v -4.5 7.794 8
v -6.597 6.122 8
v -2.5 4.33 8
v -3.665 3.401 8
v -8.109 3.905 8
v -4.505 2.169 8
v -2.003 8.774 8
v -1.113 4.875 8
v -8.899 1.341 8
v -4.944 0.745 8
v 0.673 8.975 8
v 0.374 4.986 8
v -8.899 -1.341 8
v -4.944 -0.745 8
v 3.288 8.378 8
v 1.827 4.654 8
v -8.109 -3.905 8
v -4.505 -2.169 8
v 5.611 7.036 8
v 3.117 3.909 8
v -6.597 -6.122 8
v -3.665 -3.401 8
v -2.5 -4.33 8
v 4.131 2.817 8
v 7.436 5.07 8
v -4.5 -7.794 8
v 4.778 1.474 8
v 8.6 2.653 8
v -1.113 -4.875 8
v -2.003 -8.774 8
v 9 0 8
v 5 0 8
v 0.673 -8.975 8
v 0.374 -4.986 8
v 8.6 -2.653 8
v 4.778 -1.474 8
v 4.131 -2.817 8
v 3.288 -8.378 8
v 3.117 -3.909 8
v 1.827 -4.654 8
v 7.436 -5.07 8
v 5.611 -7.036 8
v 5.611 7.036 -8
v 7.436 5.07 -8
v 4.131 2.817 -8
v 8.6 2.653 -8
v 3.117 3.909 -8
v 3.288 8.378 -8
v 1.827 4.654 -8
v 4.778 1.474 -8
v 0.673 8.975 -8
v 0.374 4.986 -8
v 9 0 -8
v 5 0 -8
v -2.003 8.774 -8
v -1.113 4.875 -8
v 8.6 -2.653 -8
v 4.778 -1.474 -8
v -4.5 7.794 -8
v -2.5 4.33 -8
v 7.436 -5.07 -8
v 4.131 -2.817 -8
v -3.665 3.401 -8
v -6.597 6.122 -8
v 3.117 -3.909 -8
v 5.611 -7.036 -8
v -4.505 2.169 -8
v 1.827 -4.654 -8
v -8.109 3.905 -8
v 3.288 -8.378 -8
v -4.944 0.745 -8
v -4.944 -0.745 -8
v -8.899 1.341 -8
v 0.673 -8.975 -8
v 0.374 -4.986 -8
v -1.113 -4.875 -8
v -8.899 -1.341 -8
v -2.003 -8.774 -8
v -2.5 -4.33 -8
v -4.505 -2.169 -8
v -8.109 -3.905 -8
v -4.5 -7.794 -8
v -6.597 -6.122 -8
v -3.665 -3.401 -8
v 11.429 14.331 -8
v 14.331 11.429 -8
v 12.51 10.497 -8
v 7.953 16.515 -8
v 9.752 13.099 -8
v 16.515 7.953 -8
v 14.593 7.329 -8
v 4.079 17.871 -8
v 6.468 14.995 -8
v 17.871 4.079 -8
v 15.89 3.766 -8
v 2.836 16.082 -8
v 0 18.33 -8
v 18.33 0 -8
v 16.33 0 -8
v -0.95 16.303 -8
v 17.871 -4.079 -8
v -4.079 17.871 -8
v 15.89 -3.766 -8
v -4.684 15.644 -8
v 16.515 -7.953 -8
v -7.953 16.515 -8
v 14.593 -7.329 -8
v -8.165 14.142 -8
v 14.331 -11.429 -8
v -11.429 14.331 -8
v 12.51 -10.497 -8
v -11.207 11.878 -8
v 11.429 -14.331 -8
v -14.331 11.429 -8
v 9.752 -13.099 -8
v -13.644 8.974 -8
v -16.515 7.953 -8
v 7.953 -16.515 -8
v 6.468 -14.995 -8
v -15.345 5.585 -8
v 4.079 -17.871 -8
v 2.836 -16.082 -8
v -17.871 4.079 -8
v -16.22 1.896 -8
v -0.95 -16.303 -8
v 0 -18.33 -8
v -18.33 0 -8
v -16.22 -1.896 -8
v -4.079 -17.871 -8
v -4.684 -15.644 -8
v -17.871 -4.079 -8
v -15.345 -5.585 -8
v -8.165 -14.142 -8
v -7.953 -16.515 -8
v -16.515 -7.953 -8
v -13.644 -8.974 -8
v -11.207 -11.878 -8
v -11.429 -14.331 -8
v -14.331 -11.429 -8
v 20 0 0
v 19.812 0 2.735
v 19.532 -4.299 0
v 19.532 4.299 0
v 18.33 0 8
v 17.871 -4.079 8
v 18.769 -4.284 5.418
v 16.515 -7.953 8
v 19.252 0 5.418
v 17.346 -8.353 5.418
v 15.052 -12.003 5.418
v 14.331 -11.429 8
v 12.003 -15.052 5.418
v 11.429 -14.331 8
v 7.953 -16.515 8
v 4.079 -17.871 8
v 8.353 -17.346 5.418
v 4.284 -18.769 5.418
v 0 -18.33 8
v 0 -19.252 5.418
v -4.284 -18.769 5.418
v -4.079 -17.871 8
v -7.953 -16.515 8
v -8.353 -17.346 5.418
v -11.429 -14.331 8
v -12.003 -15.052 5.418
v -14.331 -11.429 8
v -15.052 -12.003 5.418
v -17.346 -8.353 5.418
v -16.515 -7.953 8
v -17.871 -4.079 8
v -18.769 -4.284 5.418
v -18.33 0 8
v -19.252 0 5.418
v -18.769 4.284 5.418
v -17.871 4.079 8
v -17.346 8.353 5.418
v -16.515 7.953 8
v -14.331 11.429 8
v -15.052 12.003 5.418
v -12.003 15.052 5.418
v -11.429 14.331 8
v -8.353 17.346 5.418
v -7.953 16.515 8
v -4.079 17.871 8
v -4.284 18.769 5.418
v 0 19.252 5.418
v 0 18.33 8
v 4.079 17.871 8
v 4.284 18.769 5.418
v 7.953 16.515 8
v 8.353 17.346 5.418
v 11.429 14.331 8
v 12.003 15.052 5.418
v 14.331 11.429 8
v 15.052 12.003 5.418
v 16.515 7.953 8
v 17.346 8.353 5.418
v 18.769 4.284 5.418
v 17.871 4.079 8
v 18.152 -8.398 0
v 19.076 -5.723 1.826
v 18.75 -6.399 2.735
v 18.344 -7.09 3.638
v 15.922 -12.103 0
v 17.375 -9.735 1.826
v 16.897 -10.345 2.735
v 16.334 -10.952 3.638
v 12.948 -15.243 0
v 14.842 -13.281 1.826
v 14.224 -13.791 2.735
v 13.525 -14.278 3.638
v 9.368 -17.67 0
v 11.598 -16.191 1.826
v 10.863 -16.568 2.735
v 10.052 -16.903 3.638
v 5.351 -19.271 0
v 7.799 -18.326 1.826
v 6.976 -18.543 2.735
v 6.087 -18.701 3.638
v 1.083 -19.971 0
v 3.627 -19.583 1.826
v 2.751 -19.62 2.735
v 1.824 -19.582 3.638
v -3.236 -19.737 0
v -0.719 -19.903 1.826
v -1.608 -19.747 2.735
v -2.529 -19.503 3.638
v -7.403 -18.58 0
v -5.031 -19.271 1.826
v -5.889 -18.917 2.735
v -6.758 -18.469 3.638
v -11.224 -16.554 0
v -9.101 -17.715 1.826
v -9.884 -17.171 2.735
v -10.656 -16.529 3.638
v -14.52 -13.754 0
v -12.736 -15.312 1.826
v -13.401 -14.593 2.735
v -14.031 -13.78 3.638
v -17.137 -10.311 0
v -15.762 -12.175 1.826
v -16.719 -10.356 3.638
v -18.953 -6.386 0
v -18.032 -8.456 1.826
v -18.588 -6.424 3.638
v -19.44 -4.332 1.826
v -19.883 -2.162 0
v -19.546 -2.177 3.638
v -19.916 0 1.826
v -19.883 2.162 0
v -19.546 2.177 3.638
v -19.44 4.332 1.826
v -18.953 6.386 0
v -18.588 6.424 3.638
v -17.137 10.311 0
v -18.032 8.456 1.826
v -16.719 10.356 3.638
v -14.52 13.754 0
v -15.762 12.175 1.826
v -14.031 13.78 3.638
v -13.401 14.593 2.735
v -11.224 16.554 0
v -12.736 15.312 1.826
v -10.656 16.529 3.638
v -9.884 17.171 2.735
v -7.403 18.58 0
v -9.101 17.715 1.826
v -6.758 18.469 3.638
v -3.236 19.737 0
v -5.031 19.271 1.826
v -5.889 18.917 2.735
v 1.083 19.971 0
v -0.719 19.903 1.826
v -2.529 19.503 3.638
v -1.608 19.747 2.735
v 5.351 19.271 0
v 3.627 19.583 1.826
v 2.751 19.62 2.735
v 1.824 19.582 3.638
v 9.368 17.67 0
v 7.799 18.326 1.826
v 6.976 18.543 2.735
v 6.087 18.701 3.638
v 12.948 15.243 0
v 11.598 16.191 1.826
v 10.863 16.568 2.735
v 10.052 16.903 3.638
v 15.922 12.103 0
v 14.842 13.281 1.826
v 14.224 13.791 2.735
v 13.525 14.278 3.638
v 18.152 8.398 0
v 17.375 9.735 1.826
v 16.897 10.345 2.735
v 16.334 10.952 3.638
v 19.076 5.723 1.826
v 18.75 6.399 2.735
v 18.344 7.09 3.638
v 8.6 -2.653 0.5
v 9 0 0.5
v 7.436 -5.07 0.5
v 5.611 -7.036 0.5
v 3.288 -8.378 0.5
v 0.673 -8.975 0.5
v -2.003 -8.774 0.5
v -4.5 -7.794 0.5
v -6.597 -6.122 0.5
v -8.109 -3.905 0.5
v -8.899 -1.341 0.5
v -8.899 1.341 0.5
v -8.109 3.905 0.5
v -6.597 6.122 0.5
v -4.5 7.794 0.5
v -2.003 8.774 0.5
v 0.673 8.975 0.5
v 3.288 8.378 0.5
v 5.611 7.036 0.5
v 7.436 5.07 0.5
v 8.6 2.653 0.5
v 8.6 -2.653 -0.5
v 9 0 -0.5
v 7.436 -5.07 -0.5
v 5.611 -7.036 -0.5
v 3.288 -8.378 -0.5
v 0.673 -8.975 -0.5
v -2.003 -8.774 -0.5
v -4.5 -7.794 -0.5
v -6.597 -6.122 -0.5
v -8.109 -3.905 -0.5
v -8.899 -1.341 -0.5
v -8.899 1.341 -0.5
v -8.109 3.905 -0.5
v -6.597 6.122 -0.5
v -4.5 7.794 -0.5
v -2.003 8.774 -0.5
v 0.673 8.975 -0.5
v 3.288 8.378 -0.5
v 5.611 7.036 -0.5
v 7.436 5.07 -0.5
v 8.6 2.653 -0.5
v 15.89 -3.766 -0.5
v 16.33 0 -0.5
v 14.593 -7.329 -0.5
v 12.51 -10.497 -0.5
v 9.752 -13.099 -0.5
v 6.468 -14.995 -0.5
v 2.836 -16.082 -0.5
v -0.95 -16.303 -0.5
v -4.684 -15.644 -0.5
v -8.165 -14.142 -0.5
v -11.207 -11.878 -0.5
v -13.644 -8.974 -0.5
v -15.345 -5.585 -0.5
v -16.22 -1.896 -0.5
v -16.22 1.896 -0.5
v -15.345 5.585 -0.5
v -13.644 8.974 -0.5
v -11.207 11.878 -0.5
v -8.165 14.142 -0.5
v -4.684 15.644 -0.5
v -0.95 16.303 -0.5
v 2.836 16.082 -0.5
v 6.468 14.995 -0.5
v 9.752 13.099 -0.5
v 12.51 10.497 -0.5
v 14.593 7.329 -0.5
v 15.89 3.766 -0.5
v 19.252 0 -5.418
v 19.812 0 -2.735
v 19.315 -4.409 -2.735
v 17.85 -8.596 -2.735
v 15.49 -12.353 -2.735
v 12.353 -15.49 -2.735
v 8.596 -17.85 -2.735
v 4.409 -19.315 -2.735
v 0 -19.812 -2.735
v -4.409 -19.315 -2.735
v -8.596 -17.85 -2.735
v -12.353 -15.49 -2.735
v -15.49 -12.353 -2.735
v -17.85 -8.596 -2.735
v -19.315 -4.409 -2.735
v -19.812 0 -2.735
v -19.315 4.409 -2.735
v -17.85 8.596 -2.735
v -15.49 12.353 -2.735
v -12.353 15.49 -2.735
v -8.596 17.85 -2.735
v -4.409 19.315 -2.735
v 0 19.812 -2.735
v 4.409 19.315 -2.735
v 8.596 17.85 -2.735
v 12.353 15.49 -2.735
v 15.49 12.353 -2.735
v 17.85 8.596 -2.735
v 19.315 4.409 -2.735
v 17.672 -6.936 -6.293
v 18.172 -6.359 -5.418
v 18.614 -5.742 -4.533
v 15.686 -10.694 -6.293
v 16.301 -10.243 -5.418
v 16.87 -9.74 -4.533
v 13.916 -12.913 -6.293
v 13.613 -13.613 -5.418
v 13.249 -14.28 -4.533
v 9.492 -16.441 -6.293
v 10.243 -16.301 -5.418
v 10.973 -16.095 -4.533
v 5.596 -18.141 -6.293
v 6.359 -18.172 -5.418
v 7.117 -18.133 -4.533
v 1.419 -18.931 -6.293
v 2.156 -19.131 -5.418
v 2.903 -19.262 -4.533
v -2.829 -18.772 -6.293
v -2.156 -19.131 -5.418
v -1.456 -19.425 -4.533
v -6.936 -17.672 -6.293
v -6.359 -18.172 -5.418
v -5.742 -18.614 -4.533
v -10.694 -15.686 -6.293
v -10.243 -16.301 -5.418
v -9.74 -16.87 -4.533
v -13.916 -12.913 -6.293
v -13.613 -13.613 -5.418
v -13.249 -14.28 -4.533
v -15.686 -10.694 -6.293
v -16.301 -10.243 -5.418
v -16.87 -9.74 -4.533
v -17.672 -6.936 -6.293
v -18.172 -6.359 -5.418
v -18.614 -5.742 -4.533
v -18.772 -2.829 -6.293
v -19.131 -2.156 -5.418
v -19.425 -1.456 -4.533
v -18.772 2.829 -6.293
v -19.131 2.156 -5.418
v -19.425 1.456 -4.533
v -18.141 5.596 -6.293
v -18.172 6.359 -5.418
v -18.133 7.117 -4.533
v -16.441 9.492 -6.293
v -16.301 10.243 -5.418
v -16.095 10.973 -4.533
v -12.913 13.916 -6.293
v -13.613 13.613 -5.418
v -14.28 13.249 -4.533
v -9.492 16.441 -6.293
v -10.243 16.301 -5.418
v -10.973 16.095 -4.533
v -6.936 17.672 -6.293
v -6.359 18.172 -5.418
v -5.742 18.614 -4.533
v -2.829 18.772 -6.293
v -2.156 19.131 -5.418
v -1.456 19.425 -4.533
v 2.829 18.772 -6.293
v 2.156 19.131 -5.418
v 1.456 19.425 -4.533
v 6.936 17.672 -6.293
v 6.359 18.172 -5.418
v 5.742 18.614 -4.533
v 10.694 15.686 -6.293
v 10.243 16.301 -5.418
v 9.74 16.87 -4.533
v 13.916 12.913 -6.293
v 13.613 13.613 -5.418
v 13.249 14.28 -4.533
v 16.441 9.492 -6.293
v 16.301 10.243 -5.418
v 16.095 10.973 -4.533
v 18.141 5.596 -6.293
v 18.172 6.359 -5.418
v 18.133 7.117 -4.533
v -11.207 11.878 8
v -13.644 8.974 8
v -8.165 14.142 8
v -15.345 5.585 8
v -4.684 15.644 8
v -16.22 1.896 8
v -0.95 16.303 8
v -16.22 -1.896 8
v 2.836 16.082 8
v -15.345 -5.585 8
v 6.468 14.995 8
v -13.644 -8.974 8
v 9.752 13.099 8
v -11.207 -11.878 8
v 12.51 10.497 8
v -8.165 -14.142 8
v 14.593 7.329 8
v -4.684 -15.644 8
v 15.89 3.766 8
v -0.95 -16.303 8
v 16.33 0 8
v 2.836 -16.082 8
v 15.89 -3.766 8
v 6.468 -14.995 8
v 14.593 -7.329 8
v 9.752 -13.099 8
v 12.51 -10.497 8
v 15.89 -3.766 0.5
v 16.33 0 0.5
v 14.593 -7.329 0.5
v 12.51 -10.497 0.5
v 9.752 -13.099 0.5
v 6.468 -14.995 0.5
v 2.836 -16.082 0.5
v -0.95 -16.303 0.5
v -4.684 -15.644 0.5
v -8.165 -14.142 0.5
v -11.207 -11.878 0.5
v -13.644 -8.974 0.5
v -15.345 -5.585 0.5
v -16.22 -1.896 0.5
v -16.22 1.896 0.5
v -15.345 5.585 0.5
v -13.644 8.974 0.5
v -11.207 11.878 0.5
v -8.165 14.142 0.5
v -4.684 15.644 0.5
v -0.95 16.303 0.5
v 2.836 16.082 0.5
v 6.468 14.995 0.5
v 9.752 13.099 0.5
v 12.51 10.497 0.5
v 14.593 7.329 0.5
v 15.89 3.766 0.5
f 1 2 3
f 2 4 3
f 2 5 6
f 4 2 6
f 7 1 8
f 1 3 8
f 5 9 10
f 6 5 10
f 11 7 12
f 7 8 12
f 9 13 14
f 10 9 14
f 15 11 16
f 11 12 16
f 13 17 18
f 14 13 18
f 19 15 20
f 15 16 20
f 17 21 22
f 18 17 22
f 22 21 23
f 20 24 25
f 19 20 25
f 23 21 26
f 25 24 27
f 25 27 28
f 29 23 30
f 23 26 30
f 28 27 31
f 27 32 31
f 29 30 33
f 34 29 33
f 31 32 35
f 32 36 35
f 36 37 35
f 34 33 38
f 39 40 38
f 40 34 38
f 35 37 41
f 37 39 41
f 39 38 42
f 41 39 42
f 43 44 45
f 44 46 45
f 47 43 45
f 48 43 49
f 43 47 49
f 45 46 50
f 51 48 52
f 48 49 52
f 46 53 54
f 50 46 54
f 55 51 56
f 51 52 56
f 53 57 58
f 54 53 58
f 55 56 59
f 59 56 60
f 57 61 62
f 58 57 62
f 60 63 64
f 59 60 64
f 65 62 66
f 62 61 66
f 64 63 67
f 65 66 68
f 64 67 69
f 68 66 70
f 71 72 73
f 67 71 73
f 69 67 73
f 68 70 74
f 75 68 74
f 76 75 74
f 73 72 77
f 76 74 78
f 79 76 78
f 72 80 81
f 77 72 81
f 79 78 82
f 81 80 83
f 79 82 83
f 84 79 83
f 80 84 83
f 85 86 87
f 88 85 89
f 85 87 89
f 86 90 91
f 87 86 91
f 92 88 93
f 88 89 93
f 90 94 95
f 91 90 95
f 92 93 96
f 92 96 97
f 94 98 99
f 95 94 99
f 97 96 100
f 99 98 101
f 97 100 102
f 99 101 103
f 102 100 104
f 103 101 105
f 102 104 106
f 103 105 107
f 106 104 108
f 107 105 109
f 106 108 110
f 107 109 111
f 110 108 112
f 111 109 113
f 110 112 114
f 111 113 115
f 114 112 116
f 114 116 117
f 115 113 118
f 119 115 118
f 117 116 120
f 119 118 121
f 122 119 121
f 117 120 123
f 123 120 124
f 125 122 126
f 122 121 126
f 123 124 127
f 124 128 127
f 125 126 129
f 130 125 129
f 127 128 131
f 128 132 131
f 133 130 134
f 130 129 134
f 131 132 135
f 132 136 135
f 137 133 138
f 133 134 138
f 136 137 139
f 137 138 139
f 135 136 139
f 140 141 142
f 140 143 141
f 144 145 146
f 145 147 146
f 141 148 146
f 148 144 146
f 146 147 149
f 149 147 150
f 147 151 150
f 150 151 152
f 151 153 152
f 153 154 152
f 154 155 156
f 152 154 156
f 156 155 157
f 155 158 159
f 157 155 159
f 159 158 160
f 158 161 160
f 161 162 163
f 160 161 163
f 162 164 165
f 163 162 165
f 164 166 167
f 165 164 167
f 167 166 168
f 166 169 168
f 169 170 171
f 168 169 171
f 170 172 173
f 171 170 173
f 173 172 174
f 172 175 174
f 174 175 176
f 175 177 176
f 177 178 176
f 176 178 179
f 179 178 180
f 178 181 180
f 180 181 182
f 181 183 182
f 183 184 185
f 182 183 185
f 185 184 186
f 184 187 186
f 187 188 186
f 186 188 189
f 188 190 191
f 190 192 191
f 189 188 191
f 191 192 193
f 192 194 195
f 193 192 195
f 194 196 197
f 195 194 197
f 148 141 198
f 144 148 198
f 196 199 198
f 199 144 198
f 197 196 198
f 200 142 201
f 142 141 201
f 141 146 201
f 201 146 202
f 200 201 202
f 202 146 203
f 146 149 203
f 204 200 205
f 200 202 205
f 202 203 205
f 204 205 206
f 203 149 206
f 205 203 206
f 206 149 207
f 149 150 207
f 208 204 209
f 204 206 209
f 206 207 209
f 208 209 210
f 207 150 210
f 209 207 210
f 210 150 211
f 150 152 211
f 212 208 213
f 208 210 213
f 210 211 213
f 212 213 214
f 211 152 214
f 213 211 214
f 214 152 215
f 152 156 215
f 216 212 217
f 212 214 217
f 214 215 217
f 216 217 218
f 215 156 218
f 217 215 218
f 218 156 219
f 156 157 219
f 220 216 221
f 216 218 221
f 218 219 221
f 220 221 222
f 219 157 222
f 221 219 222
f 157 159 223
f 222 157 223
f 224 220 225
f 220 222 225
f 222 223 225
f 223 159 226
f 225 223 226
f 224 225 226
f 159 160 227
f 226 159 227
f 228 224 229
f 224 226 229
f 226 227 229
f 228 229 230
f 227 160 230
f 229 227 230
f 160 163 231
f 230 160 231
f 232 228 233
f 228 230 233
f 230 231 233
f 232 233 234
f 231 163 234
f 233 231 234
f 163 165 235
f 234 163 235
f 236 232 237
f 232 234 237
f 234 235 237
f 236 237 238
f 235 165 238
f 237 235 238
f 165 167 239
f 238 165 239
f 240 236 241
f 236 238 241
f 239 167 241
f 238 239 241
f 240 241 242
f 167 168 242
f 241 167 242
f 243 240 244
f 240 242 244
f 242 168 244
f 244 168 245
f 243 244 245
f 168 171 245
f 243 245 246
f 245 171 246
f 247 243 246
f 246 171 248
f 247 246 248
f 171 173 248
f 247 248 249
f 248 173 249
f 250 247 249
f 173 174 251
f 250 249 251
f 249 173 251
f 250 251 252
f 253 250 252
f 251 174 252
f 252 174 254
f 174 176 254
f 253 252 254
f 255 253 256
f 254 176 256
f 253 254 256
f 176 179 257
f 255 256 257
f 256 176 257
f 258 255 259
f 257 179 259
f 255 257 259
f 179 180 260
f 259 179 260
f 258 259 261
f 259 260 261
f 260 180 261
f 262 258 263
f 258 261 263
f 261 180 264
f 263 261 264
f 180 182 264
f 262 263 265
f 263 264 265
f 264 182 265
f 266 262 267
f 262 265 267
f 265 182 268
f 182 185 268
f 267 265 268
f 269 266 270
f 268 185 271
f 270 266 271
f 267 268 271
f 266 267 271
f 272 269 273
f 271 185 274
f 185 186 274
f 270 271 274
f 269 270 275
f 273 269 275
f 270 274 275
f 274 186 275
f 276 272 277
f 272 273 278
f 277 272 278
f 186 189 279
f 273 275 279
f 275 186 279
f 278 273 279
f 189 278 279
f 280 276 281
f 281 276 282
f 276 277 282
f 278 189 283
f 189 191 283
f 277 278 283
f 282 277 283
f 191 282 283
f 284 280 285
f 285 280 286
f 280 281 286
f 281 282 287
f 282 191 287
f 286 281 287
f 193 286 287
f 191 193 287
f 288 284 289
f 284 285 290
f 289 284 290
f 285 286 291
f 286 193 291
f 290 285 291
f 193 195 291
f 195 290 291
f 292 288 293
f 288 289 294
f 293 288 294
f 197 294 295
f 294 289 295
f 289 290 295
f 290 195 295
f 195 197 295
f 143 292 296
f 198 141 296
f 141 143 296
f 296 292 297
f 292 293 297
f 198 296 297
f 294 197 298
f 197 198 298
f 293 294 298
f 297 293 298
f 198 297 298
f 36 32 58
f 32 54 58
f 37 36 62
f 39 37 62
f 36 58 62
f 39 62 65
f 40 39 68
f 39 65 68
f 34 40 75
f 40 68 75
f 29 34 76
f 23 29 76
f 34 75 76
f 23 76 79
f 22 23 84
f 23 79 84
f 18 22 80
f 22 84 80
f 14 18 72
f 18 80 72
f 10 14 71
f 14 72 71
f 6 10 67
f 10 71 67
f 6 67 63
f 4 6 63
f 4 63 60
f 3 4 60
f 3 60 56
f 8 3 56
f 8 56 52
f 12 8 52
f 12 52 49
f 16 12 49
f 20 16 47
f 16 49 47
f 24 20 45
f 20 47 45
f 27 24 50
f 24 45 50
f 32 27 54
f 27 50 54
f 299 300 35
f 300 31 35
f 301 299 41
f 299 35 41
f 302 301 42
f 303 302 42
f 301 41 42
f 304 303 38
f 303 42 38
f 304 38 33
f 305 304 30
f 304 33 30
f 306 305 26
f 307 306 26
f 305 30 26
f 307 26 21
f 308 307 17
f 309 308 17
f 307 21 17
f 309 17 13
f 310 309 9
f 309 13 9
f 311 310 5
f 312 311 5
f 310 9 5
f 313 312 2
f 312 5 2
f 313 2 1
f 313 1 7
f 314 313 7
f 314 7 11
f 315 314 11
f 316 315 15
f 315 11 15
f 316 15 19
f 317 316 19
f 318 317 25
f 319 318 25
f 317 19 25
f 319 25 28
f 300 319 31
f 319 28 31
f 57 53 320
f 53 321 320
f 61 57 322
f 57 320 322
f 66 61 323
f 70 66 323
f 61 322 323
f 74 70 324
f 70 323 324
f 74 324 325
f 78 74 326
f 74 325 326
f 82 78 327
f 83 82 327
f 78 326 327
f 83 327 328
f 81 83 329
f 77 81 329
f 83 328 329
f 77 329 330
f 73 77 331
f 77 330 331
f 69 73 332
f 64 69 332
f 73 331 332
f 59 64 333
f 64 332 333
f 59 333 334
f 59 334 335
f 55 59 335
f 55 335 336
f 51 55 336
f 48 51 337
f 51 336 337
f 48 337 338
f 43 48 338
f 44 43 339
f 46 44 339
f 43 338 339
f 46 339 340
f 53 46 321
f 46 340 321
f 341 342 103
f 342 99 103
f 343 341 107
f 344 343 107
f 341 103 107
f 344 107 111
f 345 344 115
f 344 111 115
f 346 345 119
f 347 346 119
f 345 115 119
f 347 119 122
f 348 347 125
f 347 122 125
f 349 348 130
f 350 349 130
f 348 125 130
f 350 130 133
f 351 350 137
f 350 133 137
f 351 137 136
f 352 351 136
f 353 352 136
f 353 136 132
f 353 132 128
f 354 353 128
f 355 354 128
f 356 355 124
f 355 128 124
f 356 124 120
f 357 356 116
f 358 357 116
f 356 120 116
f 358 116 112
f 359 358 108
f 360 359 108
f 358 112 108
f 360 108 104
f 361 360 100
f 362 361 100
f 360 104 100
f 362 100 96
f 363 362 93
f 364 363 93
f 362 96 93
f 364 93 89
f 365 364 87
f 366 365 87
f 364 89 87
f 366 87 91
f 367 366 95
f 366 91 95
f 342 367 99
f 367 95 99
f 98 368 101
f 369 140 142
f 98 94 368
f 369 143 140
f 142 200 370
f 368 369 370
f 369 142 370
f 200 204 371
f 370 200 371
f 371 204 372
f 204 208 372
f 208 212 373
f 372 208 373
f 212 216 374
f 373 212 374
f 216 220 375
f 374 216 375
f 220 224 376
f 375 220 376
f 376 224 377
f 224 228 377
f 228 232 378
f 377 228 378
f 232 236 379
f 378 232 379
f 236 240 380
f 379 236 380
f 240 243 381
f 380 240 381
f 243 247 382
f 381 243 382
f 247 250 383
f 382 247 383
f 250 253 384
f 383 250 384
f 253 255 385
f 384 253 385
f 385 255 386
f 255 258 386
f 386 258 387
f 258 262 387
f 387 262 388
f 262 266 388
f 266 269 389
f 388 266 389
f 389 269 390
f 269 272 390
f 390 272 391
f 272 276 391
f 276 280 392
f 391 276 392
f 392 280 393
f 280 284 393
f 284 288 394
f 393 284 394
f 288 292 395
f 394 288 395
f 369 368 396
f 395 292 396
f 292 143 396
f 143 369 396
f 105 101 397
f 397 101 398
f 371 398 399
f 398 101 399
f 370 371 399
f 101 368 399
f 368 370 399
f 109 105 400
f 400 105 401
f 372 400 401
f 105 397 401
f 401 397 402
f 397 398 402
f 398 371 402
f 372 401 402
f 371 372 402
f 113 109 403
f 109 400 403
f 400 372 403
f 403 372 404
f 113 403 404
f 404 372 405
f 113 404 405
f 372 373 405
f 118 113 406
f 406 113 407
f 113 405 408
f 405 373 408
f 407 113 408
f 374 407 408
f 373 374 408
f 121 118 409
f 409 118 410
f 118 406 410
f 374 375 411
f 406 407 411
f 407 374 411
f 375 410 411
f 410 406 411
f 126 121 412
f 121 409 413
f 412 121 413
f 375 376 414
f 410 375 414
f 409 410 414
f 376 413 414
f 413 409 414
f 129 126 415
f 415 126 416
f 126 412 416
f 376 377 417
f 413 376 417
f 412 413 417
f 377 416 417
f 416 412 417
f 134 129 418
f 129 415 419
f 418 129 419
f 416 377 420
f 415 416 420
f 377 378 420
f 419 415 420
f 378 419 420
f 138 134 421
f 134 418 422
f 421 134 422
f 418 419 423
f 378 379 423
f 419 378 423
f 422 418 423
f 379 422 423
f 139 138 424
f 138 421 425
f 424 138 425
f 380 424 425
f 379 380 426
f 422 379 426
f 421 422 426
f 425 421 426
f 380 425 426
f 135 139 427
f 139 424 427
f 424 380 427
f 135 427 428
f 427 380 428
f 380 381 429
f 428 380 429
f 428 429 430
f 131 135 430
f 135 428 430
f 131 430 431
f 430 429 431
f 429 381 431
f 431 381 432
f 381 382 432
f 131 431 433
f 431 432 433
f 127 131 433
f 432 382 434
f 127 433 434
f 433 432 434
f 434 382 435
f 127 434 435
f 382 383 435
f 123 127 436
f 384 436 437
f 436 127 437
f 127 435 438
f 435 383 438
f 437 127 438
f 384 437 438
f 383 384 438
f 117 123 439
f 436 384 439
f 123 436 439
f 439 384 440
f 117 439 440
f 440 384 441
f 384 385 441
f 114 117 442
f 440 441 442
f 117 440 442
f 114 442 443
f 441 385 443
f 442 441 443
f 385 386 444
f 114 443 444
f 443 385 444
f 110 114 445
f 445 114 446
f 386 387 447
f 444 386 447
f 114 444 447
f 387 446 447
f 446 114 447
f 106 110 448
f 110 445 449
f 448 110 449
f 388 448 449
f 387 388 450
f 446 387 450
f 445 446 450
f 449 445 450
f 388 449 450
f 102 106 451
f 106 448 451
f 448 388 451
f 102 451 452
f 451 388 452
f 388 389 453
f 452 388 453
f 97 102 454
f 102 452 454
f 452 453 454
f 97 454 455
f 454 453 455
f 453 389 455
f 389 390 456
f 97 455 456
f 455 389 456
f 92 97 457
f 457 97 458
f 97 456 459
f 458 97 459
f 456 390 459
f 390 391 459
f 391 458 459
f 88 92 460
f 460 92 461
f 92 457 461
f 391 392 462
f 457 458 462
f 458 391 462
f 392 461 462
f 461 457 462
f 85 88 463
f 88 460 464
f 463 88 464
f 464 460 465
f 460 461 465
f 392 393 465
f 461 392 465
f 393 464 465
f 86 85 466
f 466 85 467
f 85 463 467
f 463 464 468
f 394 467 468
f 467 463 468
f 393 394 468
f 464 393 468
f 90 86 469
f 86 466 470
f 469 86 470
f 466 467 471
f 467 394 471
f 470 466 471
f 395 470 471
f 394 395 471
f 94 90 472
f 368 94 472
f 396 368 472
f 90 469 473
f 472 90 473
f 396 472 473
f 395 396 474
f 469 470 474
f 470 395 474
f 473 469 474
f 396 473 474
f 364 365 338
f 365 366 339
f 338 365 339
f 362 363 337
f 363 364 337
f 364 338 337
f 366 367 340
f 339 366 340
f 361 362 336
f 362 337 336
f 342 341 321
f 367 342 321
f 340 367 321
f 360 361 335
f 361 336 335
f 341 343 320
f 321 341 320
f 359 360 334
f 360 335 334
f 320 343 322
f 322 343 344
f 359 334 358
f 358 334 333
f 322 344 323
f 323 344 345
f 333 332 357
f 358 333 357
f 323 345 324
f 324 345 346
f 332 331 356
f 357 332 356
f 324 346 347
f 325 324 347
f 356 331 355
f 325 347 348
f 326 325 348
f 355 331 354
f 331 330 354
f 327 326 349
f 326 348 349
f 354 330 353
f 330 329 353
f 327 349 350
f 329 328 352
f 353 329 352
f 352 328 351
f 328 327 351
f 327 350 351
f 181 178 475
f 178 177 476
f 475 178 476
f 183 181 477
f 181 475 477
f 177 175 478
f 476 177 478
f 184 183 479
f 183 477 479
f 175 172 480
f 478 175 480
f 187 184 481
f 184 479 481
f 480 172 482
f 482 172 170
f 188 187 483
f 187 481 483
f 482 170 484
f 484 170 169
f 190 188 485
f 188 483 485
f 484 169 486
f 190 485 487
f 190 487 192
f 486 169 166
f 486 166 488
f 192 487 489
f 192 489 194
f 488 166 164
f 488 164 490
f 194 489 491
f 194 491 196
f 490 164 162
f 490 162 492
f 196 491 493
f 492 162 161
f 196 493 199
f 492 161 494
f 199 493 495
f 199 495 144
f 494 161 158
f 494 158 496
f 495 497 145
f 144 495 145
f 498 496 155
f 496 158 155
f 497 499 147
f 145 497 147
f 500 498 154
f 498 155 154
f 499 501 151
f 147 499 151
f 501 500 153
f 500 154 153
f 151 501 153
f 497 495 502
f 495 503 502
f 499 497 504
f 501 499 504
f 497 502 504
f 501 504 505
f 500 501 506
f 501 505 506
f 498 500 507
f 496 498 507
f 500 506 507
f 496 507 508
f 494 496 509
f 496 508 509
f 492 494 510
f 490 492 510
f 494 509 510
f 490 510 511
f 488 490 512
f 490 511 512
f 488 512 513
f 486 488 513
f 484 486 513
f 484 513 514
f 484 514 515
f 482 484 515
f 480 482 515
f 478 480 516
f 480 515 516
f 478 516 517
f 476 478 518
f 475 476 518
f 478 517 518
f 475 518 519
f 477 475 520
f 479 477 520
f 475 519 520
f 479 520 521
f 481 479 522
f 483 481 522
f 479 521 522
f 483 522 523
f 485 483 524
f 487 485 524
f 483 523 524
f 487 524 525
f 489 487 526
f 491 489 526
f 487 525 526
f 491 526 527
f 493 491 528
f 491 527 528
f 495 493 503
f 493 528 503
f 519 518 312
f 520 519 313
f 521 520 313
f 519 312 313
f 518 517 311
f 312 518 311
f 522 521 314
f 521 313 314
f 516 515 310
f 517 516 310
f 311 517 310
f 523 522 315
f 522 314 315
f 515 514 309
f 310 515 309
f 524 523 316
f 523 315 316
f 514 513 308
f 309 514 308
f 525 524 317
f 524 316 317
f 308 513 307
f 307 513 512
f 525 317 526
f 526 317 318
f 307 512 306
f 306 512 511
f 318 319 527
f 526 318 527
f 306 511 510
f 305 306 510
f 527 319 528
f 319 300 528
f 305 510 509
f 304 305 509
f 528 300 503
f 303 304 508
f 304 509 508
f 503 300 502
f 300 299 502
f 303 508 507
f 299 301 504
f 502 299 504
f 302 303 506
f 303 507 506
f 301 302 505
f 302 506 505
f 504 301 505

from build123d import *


with BuildPart() as f1:
    # F0 (on Front) → F1 (revolve)
    with BuildSketch(Plane.XZ):
        with BuildLine():
            ThreePointArc((18.330303, -8), (19.578126, -4.086193), (20, 0))
            ThreePointArc((20, 0), (19.578126, 4.086193), (18.330303, 8))
            Line((18.330303, 8), (16.330303, 8))
            Line((16.330303, 8), (16.330303, 0.5))
            Line((16.330303, 0.5), (9, 0.5))
            Line((9, 0.5), (9, 8))
            Line((9, 8), (5, 8))
            Line((5, 8), (5, -8))
            Line((5, -8), (9, -8))
            Line((9, -8), (9, -0.5))
            Line((9, -0.5), (16.330303, -0.5))
            Line((16.330303, -0.5), (16.330303, -8))
            Line((16.330303, -8), (18.330303, -8))
        make_face()
    revolve(axis=Axis((0, 0, 0), (0, 0, -1)))


solid = f1.part
